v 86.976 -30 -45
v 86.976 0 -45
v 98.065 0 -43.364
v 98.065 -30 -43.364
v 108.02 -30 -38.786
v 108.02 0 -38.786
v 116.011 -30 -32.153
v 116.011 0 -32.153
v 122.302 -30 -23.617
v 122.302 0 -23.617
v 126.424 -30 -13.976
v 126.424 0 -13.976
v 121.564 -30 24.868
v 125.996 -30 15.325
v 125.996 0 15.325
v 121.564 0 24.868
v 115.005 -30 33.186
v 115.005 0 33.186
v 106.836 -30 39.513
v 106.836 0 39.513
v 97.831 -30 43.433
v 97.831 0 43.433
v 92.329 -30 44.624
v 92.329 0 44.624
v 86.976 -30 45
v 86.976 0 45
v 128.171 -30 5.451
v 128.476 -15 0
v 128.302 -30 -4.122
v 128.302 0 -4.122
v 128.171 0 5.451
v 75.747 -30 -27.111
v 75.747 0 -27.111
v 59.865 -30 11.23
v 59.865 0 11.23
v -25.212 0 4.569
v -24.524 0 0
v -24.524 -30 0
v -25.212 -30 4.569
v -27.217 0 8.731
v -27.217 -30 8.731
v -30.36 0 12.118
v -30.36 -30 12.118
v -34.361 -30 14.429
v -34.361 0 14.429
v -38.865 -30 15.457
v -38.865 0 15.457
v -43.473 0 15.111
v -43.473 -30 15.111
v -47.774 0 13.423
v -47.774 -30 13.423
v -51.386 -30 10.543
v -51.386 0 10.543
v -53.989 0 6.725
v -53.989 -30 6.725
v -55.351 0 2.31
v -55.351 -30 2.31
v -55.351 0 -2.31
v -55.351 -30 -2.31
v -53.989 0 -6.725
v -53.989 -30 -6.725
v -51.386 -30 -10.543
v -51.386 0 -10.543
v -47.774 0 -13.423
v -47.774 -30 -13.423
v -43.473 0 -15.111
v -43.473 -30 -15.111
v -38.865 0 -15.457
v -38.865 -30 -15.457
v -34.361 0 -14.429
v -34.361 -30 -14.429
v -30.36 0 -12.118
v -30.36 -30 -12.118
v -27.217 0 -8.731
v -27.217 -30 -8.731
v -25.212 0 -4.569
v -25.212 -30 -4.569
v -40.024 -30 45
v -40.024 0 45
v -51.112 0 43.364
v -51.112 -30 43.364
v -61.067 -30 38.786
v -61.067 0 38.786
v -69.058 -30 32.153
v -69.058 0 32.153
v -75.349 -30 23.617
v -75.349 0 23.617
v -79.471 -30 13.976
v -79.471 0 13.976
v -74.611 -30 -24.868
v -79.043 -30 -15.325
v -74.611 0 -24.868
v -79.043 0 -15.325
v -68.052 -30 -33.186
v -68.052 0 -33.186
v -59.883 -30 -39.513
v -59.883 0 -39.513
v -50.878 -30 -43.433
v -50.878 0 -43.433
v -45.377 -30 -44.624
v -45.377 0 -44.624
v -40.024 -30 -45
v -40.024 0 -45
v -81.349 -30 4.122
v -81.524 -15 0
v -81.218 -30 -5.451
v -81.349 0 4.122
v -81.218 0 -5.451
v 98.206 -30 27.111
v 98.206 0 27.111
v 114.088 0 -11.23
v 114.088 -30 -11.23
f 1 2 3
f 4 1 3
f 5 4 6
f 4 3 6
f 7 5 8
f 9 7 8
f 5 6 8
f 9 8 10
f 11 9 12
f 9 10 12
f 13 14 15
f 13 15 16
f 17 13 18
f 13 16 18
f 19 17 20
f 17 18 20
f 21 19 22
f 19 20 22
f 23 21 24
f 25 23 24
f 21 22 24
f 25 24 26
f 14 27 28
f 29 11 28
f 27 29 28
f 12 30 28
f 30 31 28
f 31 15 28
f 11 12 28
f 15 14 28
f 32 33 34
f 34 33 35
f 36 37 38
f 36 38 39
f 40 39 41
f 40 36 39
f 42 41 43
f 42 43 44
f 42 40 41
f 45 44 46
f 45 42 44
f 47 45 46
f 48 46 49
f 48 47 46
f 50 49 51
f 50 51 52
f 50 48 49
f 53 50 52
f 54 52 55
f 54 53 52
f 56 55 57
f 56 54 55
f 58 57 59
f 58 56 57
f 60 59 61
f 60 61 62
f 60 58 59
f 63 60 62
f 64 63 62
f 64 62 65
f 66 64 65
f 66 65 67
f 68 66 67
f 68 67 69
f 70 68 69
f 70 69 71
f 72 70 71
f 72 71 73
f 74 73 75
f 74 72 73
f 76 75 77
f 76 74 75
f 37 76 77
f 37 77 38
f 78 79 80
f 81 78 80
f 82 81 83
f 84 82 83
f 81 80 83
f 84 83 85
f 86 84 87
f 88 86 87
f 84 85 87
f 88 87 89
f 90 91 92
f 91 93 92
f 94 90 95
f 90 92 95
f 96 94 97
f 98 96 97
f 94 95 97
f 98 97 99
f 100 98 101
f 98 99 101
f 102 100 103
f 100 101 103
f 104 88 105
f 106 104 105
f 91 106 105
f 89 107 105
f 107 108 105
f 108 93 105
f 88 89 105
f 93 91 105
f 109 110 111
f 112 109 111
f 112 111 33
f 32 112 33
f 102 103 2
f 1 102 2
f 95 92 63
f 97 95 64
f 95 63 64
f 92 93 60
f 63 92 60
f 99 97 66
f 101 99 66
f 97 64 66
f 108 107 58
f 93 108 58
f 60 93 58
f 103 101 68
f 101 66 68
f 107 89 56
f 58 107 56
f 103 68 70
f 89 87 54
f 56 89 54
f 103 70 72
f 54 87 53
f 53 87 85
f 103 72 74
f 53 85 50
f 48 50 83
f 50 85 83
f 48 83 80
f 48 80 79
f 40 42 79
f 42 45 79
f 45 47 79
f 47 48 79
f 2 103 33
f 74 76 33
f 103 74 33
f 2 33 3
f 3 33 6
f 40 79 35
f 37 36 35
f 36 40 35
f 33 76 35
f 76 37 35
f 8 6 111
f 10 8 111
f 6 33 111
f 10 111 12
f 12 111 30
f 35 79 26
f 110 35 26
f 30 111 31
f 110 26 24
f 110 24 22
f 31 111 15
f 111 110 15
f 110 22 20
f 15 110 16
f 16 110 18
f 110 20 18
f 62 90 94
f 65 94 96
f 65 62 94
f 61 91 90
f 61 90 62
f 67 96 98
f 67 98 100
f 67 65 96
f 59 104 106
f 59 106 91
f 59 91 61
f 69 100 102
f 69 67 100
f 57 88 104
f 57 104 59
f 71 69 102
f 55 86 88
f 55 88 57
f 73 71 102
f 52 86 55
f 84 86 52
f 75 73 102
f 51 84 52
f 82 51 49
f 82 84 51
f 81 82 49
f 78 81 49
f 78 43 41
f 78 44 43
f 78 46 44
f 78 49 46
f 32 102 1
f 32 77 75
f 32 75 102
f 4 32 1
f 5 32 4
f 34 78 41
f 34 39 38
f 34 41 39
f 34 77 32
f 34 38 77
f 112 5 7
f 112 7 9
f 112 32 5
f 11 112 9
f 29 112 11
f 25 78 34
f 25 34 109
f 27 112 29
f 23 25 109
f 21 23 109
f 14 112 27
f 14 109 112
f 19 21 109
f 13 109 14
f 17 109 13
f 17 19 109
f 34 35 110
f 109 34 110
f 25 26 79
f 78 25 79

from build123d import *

# Parameters (mm, degrees)
F0_R     = 15.5
F1_DEPTH = 30


with BuildPart() as f1:
    # F0 (on Front) → F1 (new body)
    with BuildSketch(Plane.XZ):
        with BuildLine():
            Line((86.9763747505, 45), (-40.0236252495, 45))
            add(Edge.make_bspline(
                [(-40.0236252495, 45), (-81.5236252495, 45), (-81.5236252495, 0), (-81.5236252495, -45), (-40.0236252495, -45)],
                knots=[0, 0, 0, 1.5707963268, 1.5707963268, 3.1415926536, 3.1415926536, 3.1415926536], degree=2, weights=[1, 0.7071067812, 1, 0.7071067812, 1]))
            Line((-40.0236252495, -45), (86.9763747505, -45))
            add(Edge.make_bspline(
                [(86.9763747505, -45), (128.4763747505, -45), (128.4763747505, 0), (128.4763747505, 45), (86.9763747505, 45)],
                knots=[3.1415926536, 3.1415926536, 3.1415926536, 4.7123889804, 4.7123889804, 6.2831853072, 6.2831853072, 6.2831853072], degree=2, weights=[1, 0.7071067812, 1, 0.7071067812, 1]))
        make_face()
        with Locations((-40.0236252495, 0)):
            Circle(F0_R, mode=Mode.SUBTRACT)
        Polygon((75.7465556724, -27.1111815212), (64.5167365944, 0), (59.8651932293, 11.229819078), (98.2061938285, 27.1111815212), (114.0875562716, -11.229819078), align=None, mode=Mode.SUBTRACT)
    extrude(amount=F1_DEPTH)


solid = f1.part
